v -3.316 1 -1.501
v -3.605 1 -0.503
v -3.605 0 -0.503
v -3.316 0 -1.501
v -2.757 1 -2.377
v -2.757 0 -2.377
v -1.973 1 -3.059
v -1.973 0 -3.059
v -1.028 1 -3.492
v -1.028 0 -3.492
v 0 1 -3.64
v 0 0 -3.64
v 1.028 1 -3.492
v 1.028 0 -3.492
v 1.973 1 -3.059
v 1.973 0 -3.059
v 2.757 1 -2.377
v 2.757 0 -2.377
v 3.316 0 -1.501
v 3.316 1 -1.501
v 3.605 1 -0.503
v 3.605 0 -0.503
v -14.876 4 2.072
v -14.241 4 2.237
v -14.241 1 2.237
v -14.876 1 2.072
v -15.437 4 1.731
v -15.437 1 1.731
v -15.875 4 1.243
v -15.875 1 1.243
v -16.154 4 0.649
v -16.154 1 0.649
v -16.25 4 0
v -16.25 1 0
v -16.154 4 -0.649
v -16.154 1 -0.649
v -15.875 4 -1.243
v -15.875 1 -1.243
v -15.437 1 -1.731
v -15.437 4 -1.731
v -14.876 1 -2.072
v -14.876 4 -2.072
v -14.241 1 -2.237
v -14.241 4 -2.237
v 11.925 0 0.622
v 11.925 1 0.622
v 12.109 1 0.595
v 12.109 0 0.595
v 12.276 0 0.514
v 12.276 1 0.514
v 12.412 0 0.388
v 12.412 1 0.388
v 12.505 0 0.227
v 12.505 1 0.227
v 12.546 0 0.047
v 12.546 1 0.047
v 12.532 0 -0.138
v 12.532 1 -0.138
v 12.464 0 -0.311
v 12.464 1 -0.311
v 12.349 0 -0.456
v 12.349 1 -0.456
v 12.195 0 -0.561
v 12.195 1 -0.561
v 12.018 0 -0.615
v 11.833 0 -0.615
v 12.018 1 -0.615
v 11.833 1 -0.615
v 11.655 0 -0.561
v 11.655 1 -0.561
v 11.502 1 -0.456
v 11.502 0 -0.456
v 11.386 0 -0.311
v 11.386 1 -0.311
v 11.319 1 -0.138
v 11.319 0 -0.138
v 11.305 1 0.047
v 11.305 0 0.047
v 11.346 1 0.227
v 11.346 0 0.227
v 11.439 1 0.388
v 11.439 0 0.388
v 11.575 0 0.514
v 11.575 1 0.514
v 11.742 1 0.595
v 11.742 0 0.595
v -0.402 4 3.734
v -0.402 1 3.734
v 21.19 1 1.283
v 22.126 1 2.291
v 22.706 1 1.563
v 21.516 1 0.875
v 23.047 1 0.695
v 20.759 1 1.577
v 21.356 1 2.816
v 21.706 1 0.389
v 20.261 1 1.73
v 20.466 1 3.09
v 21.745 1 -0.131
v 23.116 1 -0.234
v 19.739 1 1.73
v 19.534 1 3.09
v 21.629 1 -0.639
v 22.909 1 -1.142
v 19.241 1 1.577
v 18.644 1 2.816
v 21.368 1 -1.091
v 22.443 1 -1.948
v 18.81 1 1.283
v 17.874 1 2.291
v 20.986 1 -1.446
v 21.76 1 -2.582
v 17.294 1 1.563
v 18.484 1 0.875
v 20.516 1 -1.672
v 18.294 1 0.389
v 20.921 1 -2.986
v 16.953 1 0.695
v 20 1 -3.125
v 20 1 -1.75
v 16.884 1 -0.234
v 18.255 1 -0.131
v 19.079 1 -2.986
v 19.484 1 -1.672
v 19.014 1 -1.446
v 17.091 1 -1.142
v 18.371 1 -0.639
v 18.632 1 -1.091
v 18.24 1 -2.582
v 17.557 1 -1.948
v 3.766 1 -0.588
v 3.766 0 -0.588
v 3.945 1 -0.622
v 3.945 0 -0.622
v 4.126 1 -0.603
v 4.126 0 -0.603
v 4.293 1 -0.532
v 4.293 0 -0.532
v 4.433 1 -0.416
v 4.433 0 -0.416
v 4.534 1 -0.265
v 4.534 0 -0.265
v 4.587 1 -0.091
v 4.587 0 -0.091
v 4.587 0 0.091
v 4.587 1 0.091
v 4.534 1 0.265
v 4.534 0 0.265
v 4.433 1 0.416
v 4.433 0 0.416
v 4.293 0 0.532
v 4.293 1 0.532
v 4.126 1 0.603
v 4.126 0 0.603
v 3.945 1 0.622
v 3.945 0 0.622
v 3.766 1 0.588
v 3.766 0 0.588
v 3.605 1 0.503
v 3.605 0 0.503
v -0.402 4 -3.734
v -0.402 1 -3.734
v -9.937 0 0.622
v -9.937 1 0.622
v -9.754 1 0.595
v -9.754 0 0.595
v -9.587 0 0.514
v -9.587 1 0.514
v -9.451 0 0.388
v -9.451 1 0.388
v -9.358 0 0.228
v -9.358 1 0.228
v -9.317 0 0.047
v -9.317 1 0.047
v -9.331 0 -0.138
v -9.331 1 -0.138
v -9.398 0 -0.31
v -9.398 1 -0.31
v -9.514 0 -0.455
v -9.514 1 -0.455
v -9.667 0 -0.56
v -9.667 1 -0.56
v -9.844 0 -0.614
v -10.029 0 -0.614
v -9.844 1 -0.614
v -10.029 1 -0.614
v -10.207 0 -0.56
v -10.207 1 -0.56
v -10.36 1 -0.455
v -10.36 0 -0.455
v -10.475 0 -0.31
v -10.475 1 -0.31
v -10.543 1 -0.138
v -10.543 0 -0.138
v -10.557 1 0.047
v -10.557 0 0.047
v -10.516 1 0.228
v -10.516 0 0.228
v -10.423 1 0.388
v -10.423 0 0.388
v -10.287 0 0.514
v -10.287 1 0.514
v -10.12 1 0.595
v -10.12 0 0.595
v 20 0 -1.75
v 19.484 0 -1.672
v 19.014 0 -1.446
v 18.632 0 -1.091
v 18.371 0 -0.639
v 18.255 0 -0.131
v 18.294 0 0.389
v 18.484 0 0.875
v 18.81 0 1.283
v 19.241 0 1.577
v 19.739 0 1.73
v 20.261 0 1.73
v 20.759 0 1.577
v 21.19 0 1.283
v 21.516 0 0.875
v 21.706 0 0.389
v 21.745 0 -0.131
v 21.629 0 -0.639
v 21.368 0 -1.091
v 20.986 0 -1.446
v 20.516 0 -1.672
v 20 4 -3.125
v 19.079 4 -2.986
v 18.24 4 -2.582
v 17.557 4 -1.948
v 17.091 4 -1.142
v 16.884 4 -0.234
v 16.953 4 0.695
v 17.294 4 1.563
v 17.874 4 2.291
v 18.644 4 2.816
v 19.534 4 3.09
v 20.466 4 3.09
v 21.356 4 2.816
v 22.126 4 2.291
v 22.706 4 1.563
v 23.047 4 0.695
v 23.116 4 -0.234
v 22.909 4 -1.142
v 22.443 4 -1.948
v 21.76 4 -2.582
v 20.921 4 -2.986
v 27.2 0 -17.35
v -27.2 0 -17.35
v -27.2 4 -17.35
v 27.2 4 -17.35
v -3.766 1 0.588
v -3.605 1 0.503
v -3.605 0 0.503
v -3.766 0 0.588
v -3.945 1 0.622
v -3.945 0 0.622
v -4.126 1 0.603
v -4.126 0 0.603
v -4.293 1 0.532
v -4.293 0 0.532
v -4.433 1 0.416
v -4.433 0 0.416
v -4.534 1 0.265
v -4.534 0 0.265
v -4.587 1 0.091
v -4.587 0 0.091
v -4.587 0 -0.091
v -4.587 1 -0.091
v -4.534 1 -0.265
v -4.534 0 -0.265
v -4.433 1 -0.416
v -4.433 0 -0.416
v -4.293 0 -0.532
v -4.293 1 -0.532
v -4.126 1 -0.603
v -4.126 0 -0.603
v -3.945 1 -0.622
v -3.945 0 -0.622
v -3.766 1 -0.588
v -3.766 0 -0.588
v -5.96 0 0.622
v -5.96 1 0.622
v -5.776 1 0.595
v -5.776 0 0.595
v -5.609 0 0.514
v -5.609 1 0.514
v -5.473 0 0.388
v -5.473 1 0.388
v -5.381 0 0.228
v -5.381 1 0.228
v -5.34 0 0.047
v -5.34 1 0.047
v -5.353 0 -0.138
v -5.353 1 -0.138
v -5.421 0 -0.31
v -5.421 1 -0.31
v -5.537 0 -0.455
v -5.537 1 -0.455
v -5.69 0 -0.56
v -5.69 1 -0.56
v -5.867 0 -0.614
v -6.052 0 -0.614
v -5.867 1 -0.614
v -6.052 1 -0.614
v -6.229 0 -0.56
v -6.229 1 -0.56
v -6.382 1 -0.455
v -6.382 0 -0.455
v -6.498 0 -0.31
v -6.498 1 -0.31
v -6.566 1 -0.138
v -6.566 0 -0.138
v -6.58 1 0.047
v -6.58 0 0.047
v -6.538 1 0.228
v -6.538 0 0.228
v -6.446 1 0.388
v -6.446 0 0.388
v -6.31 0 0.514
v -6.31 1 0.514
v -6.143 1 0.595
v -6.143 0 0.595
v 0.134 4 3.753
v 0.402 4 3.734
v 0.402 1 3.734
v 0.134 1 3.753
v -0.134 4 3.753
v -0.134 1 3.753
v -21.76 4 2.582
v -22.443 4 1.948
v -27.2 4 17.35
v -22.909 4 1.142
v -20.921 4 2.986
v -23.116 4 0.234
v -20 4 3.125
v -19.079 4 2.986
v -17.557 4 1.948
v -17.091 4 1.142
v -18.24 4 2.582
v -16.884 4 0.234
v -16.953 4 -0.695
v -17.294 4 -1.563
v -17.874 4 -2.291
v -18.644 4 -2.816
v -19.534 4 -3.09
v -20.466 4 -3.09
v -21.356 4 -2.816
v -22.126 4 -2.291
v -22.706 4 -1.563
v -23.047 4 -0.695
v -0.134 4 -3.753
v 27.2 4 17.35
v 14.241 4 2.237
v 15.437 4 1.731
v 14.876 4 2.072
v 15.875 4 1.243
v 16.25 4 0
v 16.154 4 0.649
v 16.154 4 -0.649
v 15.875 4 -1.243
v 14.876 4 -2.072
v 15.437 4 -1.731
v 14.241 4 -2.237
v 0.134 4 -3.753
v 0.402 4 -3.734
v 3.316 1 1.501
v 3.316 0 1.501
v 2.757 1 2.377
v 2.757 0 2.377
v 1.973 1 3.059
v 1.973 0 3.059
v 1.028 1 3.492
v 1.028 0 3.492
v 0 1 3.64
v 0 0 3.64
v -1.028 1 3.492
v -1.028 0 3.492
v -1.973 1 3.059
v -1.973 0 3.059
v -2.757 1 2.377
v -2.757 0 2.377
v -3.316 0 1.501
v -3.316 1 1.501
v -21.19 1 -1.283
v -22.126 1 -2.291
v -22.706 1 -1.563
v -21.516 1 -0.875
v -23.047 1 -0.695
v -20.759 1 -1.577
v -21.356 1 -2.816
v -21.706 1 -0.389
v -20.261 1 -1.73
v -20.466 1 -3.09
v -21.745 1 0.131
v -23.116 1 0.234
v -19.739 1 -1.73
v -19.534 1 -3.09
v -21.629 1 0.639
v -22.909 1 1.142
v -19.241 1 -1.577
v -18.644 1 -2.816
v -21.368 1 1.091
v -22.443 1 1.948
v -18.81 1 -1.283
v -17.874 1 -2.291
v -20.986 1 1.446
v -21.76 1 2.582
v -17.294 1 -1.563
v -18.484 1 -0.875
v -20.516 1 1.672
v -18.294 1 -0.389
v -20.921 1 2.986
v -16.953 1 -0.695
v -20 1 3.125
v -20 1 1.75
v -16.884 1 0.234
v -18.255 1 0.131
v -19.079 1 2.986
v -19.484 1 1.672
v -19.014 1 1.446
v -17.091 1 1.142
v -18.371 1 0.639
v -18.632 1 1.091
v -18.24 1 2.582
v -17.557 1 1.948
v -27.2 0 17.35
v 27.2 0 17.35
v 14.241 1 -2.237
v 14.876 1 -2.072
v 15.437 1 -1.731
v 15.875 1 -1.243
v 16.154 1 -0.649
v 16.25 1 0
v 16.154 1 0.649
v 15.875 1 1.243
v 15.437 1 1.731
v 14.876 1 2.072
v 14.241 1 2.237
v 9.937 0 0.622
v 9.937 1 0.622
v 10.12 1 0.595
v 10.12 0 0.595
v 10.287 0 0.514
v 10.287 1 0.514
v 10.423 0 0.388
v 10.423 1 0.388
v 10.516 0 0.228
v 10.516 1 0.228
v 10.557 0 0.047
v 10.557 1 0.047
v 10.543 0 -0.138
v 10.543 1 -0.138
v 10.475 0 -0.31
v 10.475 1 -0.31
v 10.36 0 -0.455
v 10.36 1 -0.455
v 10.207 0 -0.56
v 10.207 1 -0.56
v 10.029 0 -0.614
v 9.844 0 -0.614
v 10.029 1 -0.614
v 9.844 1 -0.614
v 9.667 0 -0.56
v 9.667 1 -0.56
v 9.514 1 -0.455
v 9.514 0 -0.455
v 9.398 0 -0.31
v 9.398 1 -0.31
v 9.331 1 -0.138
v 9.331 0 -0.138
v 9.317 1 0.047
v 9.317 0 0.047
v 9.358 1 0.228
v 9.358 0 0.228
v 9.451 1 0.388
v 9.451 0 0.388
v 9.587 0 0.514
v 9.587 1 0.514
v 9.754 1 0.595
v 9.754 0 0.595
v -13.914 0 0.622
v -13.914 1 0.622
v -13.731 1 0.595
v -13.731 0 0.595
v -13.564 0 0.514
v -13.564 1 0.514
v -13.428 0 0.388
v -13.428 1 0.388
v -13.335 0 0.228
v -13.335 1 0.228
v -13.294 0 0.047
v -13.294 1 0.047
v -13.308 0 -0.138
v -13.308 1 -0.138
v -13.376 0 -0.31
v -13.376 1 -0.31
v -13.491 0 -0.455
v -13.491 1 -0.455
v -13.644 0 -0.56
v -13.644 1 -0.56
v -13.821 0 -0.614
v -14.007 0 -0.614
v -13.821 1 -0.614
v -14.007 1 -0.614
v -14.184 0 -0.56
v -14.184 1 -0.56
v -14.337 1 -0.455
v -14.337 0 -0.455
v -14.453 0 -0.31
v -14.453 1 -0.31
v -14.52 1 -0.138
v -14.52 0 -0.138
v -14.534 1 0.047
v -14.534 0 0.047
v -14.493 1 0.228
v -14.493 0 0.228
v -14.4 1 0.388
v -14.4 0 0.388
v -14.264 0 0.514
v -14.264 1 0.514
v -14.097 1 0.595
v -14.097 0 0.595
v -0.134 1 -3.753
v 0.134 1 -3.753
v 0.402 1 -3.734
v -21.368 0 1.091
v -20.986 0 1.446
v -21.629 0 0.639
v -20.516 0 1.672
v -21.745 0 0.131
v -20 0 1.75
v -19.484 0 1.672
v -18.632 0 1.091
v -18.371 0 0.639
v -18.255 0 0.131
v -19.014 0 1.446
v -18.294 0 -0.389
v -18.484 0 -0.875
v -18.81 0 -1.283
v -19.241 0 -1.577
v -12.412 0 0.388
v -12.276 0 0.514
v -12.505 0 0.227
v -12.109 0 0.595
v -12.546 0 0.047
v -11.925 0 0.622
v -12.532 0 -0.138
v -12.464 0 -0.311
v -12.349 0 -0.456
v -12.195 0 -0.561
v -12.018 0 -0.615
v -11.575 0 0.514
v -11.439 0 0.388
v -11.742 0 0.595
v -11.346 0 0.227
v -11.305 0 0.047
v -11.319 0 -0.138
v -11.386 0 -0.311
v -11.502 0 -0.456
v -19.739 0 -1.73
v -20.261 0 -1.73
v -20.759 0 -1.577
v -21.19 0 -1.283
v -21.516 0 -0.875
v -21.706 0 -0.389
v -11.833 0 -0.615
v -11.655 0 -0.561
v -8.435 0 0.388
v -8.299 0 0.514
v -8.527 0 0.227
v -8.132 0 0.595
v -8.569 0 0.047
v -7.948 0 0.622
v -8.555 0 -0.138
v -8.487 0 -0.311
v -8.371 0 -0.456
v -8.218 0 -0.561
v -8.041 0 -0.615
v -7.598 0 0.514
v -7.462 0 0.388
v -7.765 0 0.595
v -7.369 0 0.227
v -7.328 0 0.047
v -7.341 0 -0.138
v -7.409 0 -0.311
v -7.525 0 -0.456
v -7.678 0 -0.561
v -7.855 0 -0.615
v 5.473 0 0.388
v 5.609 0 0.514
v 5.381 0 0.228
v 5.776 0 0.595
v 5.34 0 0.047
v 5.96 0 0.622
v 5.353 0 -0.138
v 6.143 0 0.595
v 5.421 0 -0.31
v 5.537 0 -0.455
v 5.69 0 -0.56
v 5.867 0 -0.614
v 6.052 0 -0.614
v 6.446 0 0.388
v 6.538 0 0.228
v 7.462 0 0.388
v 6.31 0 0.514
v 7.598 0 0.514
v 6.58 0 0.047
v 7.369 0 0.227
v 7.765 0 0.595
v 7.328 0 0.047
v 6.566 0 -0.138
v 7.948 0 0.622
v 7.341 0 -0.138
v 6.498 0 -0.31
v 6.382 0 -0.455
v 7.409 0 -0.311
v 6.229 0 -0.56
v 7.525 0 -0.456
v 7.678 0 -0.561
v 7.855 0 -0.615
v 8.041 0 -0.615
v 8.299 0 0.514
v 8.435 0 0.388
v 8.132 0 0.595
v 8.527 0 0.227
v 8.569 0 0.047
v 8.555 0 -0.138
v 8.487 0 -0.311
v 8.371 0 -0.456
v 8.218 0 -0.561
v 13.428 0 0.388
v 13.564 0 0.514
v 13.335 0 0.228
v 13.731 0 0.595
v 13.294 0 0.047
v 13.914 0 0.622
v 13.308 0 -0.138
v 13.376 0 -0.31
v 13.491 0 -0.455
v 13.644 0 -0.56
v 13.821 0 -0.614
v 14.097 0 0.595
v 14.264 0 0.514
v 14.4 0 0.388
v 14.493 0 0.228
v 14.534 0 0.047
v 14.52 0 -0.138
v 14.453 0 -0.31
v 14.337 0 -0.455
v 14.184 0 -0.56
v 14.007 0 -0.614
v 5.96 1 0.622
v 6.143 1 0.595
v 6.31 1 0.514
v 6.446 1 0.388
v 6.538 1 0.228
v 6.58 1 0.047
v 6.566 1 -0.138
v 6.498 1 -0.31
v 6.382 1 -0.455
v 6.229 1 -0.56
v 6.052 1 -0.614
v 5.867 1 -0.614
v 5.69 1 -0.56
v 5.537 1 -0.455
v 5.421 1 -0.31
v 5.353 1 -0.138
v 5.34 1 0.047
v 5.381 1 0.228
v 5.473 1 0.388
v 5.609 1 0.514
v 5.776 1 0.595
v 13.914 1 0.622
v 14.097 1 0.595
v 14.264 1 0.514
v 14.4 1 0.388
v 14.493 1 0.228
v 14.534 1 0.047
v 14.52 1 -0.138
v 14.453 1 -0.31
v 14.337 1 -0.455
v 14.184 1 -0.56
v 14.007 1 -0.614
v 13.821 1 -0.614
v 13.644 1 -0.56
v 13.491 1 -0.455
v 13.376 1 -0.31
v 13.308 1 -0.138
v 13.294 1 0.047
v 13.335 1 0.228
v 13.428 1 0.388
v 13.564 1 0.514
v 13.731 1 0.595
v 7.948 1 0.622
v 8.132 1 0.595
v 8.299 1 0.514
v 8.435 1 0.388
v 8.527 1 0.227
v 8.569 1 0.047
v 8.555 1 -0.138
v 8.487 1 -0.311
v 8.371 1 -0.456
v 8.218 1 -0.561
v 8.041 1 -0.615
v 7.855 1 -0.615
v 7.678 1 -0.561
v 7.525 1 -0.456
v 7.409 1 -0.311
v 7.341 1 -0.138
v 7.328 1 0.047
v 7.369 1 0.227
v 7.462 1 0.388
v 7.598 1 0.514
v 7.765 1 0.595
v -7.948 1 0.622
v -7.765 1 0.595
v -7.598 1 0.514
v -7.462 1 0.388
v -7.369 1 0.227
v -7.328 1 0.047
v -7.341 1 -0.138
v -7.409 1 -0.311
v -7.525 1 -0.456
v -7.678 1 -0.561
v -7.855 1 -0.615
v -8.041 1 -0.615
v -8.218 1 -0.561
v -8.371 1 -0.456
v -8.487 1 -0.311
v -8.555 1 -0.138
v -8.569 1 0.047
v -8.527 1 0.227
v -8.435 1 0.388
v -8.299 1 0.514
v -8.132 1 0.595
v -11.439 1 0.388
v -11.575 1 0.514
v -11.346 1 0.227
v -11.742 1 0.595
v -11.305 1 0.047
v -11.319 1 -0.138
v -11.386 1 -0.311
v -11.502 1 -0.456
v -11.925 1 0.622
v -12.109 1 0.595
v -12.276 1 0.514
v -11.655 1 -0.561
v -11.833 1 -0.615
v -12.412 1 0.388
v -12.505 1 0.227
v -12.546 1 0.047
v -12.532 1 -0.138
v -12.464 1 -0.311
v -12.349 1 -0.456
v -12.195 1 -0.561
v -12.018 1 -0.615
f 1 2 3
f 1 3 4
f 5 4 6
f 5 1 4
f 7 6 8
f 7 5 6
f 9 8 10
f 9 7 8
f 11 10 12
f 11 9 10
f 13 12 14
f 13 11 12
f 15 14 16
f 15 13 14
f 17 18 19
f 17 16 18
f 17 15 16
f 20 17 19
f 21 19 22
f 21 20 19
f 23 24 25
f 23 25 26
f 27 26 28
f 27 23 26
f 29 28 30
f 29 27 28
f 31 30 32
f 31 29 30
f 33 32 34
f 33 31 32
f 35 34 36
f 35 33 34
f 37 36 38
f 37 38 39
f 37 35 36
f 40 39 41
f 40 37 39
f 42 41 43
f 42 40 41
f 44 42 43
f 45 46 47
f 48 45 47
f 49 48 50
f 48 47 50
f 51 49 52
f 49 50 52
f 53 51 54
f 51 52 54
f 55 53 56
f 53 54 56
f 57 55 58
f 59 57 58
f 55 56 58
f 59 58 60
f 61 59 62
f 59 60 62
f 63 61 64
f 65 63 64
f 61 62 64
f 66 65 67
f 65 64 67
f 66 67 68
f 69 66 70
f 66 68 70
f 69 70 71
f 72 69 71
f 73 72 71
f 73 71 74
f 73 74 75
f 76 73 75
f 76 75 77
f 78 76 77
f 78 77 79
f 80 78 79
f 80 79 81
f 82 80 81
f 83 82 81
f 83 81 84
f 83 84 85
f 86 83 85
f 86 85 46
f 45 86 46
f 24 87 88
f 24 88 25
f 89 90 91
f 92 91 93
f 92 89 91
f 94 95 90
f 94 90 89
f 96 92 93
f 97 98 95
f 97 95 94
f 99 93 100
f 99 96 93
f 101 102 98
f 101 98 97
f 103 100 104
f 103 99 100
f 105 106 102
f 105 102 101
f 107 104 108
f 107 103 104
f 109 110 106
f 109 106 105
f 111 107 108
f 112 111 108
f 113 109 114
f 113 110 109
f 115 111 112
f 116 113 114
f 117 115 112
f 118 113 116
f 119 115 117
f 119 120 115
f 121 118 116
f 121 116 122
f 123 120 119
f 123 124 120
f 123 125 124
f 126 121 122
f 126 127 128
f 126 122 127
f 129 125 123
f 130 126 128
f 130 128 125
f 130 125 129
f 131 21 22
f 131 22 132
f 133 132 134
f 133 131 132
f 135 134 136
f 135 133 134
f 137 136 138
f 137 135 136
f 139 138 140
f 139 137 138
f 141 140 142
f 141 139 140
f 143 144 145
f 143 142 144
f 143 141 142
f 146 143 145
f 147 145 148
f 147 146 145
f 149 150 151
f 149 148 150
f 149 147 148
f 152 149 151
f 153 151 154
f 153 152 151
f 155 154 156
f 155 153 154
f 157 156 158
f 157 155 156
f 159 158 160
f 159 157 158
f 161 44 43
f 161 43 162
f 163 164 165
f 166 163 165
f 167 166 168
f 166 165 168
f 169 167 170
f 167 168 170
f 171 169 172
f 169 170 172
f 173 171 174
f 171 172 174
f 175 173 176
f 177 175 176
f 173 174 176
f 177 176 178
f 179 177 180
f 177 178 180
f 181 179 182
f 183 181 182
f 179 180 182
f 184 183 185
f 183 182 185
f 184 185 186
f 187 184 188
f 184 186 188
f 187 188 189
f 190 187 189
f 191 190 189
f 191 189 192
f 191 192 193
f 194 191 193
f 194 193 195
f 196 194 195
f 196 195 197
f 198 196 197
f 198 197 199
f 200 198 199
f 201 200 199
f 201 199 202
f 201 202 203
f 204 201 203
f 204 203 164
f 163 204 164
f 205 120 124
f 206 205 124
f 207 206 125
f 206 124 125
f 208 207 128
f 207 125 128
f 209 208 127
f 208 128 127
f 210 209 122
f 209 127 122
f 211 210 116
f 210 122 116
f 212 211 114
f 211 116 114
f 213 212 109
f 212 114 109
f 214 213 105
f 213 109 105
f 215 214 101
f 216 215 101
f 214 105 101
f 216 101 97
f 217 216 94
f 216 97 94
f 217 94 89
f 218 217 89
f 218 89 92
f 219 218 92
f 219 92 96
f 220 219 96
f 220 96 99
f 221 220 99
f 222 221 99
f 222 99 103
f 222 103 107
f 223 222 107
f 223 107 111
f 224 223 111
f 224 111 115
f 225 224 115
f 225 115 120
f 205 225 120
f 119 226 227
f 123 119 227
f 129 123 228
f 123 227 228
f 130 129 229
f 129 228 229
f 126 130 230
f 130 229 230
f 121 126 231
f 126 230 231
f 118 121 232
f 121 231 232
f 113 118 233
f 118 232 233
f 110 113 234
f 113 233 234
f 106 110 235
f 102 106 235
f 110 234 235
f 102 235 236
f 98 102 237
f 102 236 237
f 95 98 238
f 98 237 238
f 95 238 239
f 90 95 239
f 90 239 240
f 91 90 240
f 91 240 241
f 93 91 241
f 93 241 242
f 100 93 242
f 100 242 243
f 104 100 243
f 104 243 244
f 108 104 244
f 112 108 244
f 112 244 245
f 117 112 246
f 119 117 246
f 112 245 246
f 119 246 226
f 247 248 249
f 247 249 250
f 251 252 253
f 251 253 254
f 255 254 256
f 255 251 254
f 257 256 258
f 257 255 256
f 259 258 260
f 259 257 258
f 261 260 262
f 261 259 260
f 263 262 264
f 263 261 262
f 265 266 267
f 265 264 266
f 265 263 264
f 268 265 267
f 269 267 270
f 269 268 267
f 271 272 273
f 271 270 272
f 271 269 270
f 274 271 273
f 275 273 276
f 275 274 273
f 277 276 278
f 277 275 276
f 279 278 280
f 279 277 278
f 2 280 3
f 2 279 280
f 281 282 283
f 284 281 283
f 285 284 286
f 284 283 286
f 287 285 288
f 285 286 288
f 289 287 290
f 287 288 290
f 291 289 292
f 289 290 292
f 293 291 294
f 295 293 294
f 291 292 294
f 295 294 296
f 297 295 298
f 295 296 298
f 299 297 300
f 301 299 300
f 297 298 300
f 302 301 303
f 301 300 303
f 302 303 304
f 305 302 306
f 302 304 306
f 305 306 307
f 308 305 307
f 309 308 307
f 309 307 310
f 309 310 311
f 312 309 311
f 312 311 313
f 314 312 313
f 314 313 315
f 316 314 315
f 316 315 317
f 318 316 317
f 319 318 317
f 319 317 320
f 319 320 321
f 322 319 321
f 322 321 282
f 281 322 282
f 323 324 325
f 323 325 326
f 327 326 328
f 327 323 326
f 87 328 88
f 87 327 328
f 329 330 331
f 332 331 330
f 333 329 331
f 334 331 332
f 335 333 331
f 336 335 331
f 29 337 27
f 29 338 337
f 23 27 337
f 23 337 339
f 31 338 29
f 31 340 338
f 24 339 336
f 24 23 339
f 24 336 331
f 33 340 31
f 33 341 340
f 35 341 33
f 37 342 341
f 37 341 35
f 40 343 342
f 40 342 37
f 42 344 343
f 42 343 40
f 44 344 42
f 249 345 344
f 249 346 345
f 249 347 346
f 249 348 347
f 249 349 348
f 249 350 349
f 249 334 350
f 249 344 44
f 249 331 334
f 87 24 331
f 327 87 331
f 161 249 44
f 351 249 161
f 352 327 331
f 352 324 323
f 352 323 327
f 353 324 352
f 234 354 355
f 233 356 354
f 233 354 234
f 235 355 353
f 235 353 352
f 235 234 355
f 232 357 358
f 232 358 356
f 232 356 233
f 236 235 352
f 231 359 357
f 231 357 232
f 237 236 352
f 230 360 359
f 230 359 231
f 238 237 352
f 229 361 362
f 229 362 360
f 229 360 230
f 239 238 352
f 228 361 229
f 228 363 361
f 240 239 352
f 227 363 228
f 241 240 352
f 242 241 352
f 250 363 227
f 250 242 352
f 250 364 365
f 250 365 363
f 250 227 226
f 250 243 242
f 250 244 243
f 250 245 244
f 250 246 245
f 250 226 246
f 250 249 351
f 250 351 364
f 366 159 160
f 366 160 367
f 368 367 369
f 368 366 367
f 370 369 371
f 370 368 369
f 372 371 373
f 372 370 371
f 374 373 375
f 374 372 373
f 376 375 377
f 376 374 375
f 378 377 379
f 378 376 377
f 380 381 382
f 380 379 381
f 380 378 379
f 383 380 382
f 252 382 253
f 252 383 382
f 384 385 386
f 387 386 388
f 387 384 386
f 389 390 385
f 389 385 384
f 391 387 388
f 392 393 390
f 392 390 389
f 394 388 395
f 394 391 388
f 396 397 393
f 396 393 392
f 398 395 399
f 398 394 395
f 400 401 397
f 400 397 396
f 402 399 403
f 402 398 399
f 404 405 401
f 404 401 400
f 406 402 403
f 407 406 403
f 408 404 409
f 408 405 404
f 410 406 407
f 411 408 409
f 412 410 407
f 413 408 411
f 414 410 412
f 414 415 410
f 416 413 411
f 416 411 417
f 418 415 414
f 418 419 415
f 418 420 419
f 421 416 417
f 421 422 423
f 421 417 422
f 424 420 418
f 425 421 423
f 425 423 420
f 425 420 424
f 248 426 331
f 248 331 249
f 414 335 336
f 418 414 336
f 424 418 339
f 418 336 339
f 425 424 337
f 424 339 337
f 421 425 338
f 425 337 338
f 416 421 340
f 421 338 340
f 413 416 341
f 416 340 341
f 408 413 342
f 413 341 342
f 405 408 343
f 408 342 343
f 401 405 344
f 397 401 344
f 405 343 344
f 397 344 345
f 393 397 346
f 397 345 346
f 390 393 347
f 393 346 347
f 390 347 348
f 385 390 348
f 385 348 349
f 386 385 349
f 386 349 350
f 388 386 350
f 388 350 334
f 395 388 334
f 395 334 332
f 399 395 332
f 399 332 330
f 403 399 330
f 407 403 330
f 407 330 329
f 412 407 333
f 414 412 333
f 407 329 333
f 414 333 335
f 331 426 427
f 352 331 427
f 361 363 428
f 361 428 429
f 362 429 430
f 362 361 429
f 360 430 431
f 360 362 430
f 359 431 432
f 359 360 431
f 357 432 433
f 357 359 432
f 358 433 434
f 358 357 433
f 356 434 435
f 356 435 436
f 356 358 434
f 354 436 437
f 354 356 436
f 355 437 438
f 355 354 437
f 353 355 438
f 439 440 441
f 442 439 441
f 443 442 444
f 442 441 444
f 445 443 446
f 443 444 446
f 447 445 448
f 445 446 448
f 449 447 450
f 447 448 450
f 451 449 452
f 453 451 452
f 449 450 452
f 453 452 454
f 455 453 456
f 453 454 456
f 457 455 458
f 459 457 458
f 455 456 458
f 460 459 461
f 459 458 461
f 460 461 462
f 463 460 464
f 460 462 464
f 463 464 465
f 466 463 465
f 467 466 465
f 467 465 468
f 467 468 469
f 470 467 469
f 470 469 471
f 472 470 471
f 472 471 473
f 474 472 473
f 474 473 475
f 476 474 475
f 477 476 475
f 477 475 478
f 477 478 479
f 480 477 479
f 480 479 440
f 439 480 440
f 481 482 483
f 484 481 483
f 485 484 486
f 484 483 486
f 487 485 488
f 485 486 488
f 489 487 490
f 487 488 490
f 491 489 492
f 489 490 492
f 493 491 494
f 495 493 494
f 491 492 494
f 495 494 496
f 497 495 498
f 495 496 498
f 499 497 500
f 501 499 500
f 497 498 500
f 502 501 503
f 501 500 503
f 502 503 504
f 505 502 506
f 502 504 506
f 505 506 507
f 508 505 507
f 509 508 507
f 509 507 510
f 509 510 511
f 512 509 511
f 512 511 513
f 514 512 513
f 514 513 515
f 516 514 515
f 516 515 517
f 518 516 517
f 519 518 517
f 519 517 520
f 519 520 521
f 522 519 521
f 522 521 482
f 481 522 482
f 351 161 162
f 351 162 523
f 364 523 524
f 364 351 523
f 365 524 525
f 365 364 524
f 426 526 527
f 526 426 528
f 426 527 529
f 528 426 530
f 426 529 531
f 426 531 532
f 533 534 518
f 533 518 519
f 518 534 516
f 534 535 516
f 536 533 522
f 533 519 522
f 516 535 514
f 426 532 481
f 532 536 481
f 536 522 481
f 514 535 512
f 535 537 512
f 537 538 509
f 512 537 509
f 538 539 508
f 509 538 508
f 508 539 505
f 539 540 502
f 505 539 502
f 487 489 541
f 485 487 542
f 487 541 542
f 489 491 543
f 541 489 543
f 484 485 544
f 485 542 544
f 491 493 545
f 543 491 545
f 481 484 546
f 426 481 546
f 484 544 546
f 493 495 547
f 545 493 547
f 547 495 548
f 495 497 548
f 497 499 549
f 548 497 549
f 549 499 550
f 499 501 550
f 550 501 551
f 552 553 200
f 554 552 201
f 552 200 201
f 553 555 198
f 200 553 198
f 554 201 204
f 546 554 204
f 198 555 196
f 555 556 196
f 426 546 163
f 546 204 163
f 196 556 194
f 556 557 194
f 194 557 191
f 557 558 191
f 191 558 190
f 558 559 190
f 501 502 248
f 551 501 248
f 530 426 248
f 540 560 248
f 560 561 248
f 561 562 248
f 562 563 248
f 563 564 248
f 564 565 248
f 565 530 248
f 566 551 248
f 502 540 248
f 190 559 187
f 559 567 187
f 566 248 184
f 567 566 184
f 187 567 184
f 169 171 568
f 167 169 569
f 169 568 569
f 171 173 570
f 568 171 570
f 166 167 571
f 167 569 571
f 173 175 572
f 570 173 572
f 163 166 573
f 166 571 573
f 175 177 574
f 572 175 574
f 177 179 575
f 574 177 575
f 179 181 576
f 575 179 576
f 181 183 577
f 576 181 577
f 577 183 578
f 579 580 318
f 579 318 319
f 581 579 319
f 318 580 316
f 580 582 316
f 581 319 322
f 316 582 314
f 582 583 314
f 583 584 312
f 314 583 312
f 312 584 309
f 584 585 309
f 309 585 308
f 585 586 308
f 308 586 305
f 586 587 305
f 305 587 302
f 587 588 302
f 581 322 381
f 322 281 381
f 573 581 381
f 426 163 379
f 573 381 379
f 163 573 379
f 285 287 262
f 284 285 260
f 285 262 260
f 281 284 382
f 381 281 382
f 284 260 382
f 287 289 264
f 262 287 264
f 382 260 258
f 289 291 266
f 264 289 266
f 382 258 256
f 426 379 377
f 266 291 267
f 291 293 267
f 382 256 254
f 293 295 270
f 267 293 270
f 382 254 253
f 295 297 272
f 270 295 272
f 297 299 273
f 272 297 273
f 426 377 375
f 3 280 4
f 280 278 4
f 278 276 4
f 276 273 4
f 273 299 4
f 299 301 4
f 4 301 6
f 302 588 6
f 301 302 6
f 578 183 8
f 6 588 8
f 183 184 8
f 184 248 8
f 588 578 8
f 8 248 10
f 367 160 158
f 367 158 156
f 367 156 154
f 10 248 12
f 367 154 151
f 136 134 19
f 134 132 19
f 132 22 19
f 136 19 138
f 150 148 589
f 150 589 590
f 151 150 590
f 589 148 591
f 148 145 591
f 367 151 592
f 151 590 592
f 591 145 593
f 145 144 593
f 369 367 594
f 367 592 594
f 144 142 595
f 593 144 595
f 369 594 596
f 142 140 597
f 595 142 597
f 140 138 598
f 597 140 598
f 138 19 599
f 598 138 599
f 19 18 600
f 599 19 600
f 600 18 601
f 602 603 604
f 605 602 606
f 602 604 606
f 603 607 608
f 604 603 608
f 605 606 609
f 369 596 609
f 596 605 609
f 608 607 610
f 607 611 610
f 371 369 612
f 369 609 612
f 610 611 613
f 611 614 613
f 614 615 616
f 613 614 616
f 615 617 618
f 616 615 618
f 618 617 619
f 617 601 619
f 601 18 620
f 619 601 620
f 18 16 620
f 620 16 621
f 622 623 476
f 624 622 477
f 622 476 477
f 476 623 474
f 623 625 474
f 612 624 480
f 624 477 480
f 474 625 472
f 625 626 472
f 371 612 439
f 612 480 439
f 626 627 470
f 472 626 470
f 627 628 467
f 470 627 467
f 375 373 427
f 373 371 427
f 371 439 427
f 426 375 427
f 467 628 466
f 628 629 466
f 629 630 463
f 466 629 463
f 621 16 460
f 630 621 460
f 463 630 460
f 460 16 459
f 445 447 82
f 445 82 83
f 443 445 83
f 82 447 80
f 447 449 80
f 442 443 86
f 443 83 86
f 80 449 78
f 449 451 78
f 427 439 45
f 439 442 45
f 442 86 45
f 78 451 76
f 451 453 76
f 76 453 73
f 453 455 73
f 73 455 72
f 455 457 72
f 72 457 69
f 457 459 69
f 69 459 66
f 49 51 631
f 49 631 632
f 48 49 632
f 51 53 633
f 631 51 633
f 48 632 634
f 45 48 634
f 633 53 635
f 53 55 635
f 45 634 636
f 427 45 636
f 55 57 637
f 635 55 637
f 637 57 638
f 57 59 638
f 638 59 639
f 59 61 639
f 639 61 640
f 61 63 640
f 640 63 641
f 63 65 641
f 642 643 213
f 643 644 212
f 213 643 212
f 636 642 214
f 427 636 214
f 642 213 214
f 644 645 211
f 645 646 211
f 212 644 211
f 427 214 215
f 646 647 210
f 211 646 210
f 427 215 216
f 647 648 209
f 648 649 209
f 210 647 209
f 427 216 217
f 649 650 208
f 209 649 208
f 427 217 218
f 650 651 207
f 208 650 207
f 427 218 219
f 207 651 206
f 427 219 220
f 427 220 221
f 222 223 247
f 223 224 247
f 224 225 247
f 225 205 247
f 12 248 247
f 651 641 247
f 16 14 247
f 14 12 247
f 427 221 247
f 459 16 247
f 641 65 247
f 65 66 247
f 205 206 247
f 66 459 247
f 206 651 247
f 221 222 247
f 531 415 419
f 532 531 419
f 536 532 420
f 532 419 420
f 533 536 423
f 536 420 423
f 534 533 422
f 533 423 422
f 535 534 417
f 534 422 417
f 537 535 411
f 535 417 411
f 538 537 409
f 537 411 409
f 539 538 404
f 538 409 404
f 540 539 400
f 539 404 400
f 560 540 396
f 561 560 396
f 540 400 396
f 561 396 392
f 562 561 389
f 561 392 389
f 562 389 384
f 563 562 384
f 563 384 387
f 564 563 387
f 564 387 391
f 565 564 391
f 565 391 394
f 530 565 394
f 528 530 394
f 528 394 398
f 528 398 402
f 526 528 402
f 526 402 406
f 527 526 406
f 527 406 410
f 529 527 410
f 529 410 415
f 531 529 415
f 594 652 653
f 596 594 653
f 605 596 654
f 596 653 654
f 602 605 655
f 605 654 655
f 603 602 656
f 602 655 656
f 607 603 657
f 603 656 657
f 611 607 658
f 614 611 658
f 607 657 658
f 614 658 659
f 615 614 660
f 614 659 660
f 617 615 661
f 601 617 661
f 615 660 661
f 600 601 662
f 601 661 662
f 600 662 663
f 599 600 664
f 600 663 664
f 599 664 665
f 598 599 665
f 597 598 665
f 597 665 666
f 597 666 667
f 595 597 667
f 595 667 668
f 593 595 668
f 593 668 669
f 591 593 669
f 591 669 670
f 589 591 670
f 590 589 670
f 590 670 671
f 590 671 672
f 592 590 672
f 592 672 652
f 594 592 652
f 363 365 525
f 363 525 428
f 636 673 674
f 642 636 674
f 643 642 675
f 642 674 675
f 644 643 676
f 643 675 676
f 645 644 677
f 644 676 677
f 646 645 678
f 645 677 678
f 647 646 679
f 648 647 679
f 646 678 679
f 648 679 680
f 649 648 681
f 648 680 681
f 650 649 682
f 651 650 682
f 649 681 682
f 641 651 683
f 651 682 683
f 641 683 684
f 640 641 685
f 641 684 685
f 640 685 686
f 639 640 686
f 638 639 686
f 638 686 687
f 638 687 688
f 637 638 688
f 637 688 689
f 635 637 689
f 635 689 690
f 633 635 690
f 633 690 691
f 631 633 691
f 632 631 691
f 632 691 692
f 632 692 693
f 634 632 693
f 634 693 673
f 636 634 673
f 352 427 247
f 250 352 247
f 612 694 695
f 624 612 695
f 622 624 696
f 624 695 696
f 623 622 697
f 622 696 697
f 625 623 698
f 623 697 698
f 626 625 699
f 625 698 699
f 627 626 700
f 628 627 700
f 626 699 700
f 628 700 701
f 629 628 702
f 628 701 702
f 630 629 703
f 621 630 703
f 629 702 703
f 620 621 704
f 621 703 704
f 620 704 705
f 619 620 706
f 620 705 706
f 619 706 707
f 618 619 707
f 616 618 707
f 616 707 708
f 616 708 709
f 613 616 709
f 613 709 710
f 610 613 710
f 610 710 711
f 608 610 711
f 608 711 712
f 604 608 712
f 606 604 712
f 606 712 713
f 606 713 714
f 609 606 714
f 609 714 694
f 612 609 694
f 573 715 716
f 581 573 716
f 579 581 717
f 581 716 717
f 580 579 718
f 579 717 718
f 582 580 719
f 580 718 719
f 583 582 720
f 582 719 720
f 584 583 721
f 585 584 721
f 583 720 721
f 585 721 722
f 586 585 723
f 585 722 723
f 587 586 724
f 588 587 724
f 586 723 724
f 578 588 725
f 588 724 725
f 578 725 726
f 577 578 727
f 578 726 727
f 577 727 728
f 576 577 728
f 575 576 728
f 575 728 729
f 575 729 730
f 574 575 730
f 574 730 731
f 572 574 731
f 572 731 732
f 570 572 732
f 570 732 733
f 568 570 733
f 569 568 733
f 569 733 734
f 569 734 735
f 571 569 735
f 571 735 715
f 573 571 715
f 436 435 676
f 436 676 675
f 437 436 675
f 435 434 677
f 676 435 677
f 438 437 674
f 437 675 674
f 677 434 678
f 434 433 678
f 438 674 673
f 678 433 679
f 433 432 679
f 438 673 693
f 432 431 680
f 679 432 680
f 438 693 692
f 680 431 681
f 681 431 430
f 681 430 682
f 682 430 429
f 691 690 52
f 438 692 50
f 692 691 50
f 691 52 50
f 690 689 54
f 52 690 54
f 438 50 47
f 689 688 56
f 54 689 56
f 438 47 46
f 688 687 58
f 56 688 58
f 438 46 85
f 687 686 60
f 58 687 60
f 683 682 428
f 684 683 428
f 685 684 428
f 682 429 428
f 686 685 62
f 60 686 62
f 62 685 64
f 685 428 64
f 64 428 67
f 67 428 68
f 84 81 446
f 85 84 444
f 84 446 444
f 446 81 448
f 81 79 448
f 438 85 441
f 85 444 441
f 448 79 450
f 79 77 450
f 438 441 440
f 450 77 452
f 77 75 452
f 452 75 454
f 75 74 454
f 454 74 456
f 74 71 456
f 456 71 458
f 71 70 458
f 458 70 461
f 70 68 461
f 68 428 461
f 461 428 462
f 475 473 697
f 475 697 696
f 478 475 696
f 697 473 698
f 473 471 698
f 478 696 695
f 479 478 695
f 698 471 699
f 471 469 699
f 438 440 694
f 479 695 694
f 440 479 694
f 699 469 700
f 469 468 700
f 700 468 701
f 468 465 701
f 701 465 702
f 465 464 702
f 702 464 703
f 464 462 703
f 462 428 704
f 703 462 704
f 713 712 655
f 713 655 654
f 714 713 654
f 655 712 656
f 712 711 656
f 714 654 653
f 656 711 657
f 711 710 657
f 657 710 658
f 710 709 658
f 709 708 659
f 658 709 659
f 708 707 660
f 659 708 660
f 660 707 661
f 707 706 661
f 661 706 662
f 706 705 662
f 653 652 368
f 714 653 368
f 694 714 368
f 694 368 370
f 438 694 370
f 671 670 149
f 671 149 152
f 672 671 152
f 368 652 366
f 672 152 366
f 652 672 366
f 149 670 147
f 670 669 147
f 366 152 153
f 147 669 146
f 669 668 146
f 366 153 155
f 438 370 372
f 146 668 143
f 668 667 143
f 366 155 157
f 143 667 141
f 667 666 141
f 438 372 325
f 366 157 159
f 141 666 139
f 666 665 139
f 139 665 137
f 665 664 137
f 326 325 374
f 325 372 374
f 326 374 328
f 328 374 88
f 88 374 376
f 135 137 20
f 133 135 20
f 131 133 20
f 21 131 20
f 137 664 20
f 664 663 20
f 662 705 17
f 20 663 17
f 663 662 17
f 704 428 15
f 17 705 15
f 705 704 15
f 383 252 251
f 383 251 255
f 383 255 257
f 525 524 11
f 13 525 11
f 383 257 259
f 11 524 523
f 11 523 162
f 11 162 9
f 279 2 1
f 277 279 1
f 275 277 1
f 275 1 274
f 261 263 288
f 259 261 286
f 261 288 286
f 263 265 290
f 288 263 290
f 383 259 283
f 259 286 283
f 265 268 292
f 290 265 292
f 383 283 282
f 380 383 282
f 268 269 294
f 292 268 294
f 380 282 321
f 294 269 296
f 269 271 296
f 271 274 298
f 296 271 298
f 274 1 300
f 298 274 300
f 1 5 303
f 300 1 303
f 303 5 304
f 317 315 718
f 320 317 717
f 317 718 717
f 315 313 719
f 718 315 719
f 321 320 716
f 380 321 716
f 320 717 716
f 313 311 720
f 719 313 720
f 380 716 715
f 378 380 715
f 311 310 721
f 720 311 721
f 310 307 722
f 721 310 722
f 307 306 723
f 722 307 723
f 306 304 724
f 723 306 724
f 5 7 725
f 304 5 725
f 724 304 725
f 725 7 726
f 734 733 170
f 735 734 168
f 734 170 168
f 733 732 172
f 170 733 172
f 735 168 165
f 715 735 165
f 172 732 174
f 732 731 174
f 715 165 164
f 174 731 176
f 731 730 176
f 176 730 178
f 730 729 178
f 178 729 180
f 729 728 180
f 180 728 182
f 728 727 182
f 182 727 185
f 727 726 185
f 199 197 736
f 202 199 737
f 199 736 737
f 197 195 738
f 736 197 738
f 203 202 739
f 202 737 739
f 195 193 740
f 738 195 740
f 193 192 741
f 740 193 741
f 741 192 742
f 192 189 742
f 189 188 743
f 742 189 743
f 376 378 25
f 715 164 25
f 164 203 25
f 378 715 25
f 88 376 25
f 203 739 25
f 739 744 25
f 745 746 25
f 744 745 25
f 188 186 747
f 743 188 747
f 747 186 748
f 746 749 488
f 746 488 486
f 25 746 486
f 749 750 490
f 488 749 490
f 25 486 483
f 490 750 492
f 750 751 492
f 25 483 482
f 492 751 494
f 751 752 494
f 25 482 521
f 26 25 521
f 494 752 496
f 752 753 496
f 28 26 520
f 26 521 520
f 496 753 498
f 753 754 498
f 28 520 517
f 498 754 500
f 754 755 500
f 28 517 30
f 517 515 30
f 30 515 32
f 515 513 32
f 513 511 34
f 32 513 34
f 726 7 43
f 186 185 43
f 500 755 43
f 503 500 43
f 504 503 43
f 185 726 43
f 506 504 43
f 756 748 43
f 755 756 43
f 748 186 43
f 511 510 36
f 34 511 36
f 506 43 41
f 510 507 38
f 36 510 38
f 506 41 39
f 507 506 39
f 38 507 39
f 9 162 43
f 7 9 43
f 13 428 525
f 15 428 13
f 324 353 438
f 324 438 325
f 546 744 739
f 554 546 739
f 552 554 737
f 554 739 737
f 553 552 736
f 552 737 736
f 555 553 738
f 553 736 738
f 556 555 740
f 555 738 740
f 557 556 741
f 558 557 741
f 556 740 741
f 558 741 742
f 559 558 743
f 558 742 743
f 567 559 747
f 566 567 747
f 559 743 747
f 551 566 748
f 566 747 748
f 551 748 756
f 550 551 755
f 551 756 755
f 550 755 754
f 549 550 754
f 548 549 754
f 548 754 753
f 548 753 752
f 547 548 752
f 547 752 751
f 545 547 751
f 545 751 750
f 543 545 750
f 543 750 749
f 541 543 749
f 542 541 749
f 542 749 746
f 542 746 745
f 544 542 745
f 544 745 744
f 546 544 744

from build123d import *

# Parameters (mm, degrees)
SKETCH1_W           = 54.3999928
SKETCH1_H           = 34.7000068
BOSS_EXTRUDE1_DEPTH = 3.999992
SKETCH2_R           = 3.125000785
CUT_EXTRUDE1_DEPTH  = 2.999994
SKETCH7_R           = 1.7499965
CUT_EXTRUDE5_DEPTH  = 33.401579995
SKETCH8_R           = 0.621776252
SKETCH8_R_2         = 0.622309086
CUT_EXTRUDE6_DEPTH  = 33.509419529
CUT_EXTRUDE7_DEPTH  = 2.999994


with BuildPart() as part:
    # Sketch1 → Boss-Extrude1 (new body)
    with BuildSketch(Plane(origin=(0, 0, 0), x_dir=(1, 0, 0), z_dir=(0, 1, 0))):
        Rectangle(SKETCH1_W, SKETCH1_H)
    extrude(amount=BOSS_EXTRUDE1_DEPTH)

    # Sketch2 → Cut-Extrude1 (cut)
    with BuildSketch(Plane(origin=(0, 3.999992, 0), x_dir=(1, 0, 0), z_dir=(0, 1, 0))):
        with Locations(Location((-19.999997415, 0, 0), (0, 0, 270))):
            Circle(SKETCH2_R)
        with Locations(Location((19.999997415, 0, 0), (0, 0, 90))):
            Circle(SKETCH2_R)
    extrude(amount=-CUT_EXTRUDE1_DEPTH, mode=Mode.SUBTRACT)

    # Sketch7 → Cut-Extrude5 (cut, through all)
    with BuildSketch(Plane(origin=(0, 0.999998, 0), x_dir=(1, 0, 0), z_dir=(0, 1, 0))):
        with Locations(Location((-19.999997415, 0, 0), (0, 0, 270))):
            Circle(SKETCH7_R)
        with Locations(Location((19.999997415, 0, 0), (0, 0, 90))):
            Circle(SKETCH7_R)
    extrude(amount=-CUT_EXTRUDE5_DEPTH, mode=Mode.SUBTRACT)

    # Sketch8 → Cut-Extrude6 (cut, through all)
    with BuildSketch(Plane(origin=(0, 3.999992, 0), x_dir=(1, 0, 0), z_dir=(0, 1, 0))):
        with Locations(Location((-13.914038205, -0.000532834, 0), (0, 0, 270))):
            Circle(SKETCH8_R)
        with Locations(Location((-11.925423769, 0, 0), (0, 0, 270))):
            Circle(SKETCH8_R_2)
        with Locations(Location((-9.936809177, -0.000532834, 0), (0, 0, 270))):
            Circle(SKETCH8_R)
        with Locations(Location((-7.948194741, 0, 0), (0, 0, 270))):
            Circle(SKETCH8_R_2)
        with Locations(Location((-5.959580149, -0.000532834, 0), (0, 0, 270))):
            Circle(SKETCH8_R)
        with BuildLine():
            ThreePointArc((3.60507443, 0.503380738), (4.593274799, 0), (3.60507443, -0.503380738))
            ThreePointArc((3.60507443, -0.503380738), (0, -3.6400486), (-3.60507443, -0.503380738))
            ThreePointArc((-3.60507443, -0.503380738), (-4.593274799, 0), (-3.60507443, 0.503380738))
            ThreePointArc((-3.60507443, 0.503380738), (0, 3.6400486), (3.60507443, 0.503380738))
        make_face()
        with Locations(Location((5.959580149, -0.000532834, 0), (0, 0, 270))):
            Circle(SKETCH8_R)
        with Locations(Location((9.936809177, -0.000532834, 0), (0, 0, 270))):
            Circle(SKETCH8_R)
        with Locations(Location((7.948194741, 0, 0), (0, 0, 270))):
            Circle(SKETCH8_R_2)
        with Locations(Location((11.925423769, 0, 0), (0, 0, 270))):
            Circle(SKETCH8_R_2)
        with Locations(Location((13.914038205, -0.000532834, 0), (0, 0, 270))):
            Circle(SKETCH8_R)
    extrude(amount=-CUT_EXTRUDE6_DEPTH, mode=Mode.SUBTRACT)

    # Sketch9 → Cut-Extrude7 (cut)
    with BuildSketch(Plane(origin=(0, 3.999992, 0), x_dir=(1, 0, 0), z_dir=(0, 1, 0))):
        with BuildLine():
            Line((-14.2410688, 2.2370542), (-0.4017772, 3.7338))
            ThreePointArc((-0.4017772, 3.7338), (0, 3.755463322), (0.4017772, 3.7338))
            Line((0.4017772, 3.7338), (14.2410688, 2.2370542))
            ThreePointArc((14.2410688, 2.2370542), (16.250002136, 0), (14.2410688, -2.2370542))
            Line((14.2410688, -2.2370542), (0.4017772, -3.7338))
            ThreePointArc((0.4017772, -3.7338), (0, -3.755463322), (-0.4017772, -3.7338))
            Line((-0.4017772, -3.7338), (-14.2410688, -2.2370542))
            ThreePointArc((-14.2410688, -2.2370542), (-16.250002136, 0), (-14.2410688, 2.2370542))
        make_face()
    extrude(amount=-CUT_EXTRUDE7_DEPTH, mode=Mode.SUBTRACT)


solid = part.part
